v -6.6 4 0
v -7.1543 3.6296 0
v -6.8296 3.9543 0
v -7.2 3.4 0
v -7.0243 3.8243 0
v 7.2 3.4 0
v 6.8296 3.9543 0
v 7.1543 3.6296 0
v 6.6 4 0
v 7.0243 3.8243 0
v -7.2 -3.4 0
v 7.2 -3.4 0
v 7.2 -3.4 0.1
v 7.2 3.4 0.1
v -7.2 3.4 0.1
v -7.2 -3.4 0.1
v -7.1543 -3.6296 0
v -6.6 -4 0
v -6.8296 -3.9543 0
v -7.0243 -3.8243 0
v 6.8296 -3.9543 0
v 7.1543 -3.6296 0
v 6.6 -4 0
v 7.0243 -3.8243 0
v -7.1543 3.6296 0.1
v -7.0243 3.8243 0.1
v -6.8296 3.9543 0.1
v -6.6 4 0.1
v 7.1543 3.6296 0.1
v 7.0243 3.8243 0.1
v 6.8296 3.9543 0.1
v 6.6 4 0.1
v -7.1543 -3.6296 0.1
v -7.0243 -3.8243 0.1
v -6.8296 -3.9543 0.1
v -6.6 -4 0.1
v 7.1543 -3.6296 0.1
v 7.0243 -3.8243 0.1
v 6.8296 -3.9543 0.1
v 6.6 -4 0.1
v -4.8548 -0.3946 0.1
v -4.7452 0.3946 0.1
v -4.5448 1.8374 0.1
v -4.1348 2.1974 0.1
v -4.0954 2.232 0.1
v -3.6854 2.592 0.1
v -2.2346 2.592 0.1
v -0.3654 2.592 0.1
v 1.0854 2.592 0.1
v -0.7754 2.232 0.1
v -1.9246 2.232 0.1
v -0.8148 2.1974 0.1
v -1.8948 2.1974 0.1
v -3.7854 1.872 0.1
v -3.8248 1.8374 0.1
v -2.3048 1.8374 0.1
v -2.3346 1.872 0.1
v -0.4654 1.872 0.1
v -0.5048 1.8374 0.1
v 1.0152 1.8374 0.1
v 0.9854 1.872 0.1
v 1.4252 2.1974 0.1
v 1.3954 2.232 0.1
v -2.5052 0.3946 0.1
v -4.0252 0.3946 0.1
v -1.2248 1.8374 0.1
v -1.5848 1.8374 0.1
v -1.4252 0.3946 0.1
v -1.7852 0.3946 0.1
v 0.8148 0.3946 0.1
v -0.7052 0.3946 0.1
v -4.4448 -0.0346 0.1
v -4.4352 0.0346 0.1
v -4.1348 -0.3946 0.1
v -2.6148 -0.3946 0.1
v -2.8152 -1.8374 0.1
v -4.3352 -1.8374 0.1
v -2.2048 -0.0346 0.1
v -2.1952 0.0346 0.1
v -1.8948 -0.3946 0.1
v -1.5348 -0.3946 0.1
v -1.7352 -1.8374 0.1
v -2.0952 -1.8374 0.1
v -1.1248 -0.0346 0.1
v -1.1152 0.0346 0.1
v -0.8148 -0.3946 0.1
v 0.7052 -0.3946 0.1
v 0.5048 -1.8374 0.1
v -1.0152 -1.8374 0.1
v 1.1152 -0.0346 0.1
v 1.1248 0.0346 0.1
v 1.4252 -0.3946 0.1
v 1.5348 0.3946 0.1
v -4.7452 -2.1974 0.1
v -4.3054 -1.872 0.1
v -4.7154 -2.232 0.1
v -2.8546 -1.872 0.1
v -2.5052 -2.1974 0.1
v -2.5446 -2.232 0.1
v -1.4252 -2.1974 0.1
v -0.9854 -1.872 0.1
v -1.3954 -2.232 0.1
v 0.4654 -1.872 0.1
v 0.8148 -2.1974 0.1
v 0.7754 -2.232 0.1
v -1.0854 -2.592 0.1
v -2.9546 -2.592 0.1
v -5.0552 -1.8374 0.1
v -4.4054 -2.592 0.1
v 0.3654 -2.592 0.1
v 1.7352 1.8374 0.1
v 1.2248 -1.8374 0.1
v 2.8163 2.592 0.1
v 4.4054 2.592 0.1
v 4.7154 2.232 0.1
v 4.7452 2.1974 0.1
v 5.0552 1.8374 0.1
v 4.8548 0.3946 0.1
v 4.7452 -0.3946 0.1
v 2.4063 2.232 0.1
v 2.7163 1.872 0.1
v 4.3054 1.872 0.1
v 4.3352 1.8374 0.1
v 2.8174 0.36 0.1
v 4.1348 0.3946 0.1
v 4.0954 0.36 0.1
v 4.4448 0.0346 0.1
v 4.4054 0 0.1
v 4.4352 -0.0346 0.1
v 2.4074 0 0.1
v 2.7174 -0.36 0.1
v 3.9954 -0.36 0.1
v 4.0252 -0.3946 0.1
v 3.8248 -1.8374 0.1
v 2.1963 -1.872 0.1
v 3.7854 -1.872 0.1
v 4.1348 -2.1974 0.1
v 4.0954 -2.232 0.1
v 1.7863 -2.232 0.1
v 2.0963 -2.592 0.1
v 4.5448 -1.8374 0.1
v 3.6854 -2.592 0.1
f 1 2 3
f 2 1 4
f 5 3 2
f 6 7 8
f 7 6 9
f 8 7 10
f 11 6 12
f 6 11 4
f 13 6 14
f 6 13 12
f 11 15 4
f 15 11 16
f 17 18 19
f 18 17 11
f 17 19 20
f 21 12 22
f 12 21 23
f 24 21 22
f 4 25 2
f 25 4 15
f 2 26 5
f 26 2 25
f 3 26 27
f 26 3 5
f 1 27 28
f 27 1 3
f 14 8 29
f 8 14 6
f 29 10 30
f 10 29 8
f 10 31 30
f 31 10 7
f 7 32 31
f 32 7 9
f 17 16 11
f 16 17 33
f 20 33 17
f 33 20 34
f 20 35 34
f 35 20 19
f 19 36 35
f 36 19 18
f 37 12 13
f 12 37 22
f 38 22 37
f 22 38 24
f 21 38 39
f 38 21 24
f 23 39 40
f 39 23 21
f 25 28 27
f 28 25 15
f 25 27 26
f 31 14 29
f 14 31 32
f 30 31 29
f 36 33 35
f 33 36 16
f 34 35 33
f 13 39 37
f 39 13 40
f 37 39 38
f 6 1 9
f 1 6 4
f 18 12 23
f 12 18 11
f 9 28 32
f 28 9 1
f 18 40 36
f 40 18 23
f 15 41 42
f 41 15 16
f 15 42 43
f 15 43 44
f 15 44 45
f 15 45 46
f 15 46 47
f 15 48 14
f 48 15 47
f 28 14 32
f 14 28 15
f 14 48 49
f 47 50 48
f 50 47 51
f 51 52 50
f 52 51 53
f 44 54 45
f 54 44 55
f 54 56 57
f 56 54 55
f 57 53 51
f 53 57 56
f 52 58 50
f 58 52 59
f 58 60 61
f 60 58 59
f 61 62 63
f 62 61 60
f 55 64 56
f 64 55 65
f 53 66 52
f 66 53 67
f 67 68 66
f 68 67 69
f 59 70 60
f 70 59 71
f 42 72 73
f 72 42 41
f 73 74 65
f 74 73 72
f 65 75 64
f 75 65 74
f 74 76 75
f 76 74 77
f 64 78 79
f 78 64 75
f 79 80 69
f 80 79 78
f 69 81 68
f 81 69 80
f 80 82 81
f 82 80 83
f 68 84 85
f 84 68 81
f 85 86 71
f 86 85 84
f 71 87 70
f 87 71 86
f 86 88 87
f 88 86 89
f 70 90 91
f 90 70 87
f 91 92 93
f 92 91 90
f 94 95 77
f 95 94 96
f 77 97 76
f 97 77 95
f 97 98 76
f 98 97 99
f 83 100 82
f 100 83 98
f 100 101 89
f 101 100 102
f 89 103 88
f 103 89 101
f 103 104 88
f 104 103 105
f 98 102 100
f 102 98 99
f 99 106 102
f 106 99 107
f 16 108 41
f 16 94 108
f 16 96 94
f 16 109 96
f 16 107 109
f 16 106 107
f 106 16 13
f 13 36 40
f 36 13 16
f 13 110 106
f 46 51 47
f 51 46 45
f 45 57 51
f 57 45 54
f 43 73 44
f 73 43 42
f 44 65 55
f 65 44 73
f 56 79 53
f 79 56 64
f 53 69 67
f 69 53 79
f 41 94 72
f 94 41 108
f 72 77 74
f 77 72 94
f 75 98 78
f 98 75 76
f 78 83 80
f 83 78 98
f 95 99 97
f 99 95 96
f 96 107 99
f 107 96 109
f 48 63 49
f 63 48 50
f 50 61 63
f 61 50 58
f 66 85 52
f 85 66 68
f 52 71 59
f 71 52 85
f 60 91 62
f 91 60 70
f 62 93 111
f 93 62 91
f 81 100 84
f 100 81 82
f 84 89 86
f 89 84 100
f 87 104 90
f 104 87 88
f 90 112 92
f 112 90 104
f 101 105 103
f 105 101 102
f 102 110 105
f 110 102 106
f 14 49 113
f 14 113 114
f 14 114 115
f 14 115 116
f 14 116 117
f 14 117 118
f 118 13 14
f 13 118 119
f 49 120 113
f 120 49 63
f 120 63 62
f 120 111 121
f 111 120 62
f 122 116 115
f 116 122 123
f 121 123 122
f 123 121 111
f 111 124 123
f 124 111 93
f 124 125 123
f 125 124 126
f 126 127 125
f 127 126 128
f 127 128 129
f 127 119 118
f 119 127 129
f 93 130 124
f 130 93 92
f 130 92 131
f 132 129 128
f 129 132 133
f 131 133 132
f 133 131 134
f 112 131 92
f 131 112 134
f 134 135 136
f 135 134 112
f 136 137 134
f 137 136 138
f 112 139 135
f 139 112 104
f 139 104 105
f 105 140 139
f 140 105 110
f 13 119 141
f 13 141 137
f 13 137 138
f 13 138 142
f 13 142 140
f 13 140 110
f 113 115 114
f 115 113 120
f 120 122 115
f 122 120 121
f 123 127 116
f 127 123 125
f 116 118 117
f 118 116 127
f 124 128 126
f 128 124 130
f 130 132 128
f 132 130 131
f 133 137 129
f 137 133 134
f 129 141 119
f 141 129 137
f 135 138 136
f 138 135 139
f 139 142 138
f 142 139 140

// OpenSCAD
// file: ../p/box3u12.scad
use <../lib.scad>
function ldraw_lib__box3u12() = [
// 0 Box with 3 Parallel Faces without Any Edges
// 0 Name: box3u12.dat
// 0 Author: J.C. Tchang [tchang]
// 0 !LDRAW_ORG Primitive UPDATE 2014-02
// 0 !LICENSE Licensed under CC BY 4.0 : see CAreadme.txt
// 
// 0 BFC CERTIFY CCW
  [0,"BFC","CERTIFY"],
  [0,"BFC","CCW"],
// 
// 0 !HISTORY 2014-12-23 [PTadmin] Official Update 2014-02
// 
// 
// 4 16 -1 1 1 1 1 1 1 1 -1 -1 1 -1
  [4,16,-1,1,1,1,1,1,1,1,-1,-1,1,-1],
// 4 16 -1 1 1 -1 0 1 1 0 1 1 1 1
  [4,16,-1,1,1,-1,0,1,1,0,1,1,1,1],
// 4 16 1 1 -1 1 0 -1 -1 0 -1 -1 1 -1
  [4,16,1,1,-1,1,0,-1,-1,0,-1,-1,1,-1],
];
module ldraw_lib__box3u12(step=0, col=false, unit=2/5, alt=false, line=0.2, solid=!$preview)
    makepoly(ldraw_lib__box3u12(), step=step, col=col, unit=unit, alt=alt, line=line, solid=solid);
ldraw_lib__box3u12(line=0.2);
// file: ../p/1-4cyli.scad
use <../lib.scad>
function ldraw_lib__1_4cyli() = [
// 0 Cylinder 0.25
// 0 Name: 1-4cyli.dat
// 0 Author: James Jessiman
// 0 !LDRAW_ORG Primitive UPDATE 2012-01
// 0 !LICENSE Licensed under CC BY 4.0 : see CAreadme.txt
// 
// 0 BFC CERTIFY CCW
  [0,"BFC","CERTIFY"],
  [0,"BFC","CCW"],
// 
// 0 !HISTORY 2002-03-23 [sbliss] Added BFC statement.
// 0 !HISTORY 2002-04-25 [PTadmin] Official Update 2002-02
// 0 !HISTORY 2007-06-22 [PTadmin] Header formatted for Contributor Agreement
// 0 !HISTORY 2008-07-01 [PTadmin] Official Update 2008-01
// 0 !HISTORY 2012-02-16 [Philo] Changed to CCW
// 0 !HISTORY 2012-03-30 [PTadmin] Official Update 2012-01
// 
// 
// 4 16 1 1 0 0.9239 1 0.3827 0.9239 0 0.3827 1 0 0
  [4,16,1,1,0,0.9239,1,0.3827,0.9239,0,0.3827,1,0,0],
// 5 24 1 0 0 1 1 0 0.9239 0 0.3827 1 0 -1
  [5,24,1,0,0,1,1,0,0.9239,0,0.3827,1,0,-1],
// 4 16 0.9239 1 0.3827 0.7071 1 0.7071 0.7071 0 0.7071 0.9239 0 0.3827
  [4,16,0.9239,1,0.3827,0.7071,1,0.7071,0.7071,0,0.7071,0.9239,0,0.3827],
// 5 24 0.9239 0 0.3827 0.9239 1 0.3827 0.7071 0 0.7071 1 0 0
  [5,24,0.9239,0,0.3827,0.9239,1,0.3827,0.7071,0,0.7071,1,0,0],
// 4 16 0.7071 1 0.7071 0.3827 1 0.9239 0.3827 0 0.9239 0.7071 0 0.7071
  [4,16,0.7071,1,0.7071,0.3827,1,0.9239,0.3827,0,0.9239,0.7071,0,0.7071],
// 5 24 0.7071 0 0.7071 0.7071 1 0.7071 0.3827 0 0.9239 0.9239 0 0.3827
  [5,24,0.7071,0,0.7071,0.7071,1,0.7071,0.3827,0,0.9239,0.9239,0,0.3827],
// 4 16 0.3827 1 0.9239 0 1 1 0 0 1 0.3827 0 0.9239
  [4,16,0.3827,1,0.9239,0,1,1,0,0,1,0.3827,0,0.9239],
// 5 24 0.3827 0 0.9239 0.3827 1 0.9239 0 0 1 0.7071 0 0.7071
  [5,24,0.3827,0,0.9239,0.3827,1,0.9239,0,0,1,0.7071,0,0.7071],
// 5 24 0 0 1 0 1 1 0.3827 0 0.9239 -1 0 1
  [5,24,0,0,1,0,1,1,0.3827,0,0.9239,-1,0,1],
];
module ldraw_lib__1_4cyli(step=0, col=false, unit=2/5, alt=false, line=0.2, solid=!$preview)
    makepoly(ldraw_lib__1_4cyli(), step=step, col=col, unit=unit, alt=alt, line=line, solid=solid);
ldraw_lib__1_4cyli(line=0.2);
// file: ../p/1-4chrd.scad
use <../lib.scad>
function ldraw_lib__1_4chrd() = [
// 0 Chord 0.25
// 0 Name: 1-4chrd.dat
// 0 Author: Max Martin Richter [MMR1988]
// 0 !LDRAW_ORG Primitive UPDATE 2023-05
// 0 !LICENSE Licensed under CC BY 4.0 : see CAreadme.txt
// 
// 0 BFC CERTIFY CCW
  [0,"BFC","CERTIFY"],
  [0,"BFC","CCW"],
// 
// 0 !HISTORY 2004-04-22 [PTadmin] Official Update 2004-02
// 0 !HISTORY 2007-10-09 [PTadmin] Header formatted for Contributor Agreement
// 0 !HISTORY 2008-07-01 [PTadmin] Official Update 2008-01
// 0 !HISTORY 2012-08-02 [MMR1988] Re-creation with PrimGen2 and Rectifier
// 0 !HISTORY 2012-08-09 [PTadmin] Official Update 2012-02
// 0 !HISTORY 2023-10-27 [OrionP] Change author to MMR1988 from hafhead
// 0 !HISTORY 2023-10-31 [OrionP] Official Update 2023-05
// 
// 4 16 0.9239 0 0.3827 0.3827 0 0.9239 0 0 1 1 0 0
  [4,16,0.9239,0,0.3827,0.3827,0,0.9239,0,0,1,1,0,0],
// 3 16 0.7071 0 0.7071 0.3827 0 0.9239 0.9239 0 0.3827
  [3,16,0.7071,0,0.7071,0.3827,0,0.9239,0.9239,0,0.3827],
];
module ldraw_lib__1_4chrd(step=0, col=false, unit=2/5, alt=false, line=0.2, solid=!$preview)
    makepoly(ldraw_lib__1_4chrd(), step=step, col=col, unit=unit, alt=alt, line=line, solid=solid);
ldraw_lib__1_4chrd(line=0.2);
// main file
use <../lib.scad>
use <s/6221655aks01.scad>
function ldraw_lib__6221655am() = [
// 0 Sticker  1.0 x  1.8 with Yellow Digital "3" on Black Background
// 0 Name: 6221655am.dat
// 0 Author: Massimo Maso [Sirio]
// 0 !LDRAW_ORG Part UPDATE 2024-09
// 0 !LICENSE Licensed under CC BY 4.0 : see CAreadme.txt
// 
// 0 BFC CERTIFY CCW
  [0,"BFC","CERTIFY"],
  [0,"BFC","CCW"],
// 
// 0 !KEYWORDS 3.0, 911 RSR, Set 75888, Speed Champions, Turbo
// 
// 0 !HISTORY 2024-10-27 [OrionP] Official Update 2024-09
// 
// 0 // Subpart
// 1 16 0 0 0 1 0 0 0 1 0 0 0 1 s\6221655aks01.dat
  [1,16,0,0,0,1,0,0,0,1,0,0,0,1, ldraw_lib__s__6221655aks01()],
// 0 // Top face
// 0 // Black faces
// 3 0 18 -.25 8.5 2.7136 -.25 6.48 7.0408 -.25 6.48
  [3,0,18,-.25,8.5,2.7136,-.25,6.48,7.0408,-.25,6.48],
// 3 0 18 -.25 8.5 7.0408 -.25 6.48 11.0136 -.25 6.48
  [3,0,18,-.25,8.5,7.0408,-.25,6.48,11.0136,-.25,6.48],
// 3 0 18 -.25 8.5 11.0136 -.25 6.48 11.7886 -.25 5.58
  [3,0,18,-.25,8.5,11.0136,-.25,6.48,11.7886,-.25,5.58],
// 3 0 18 -.25 8.5 11.7886 -.25 5.58 11.863 -.25 5.4936
  [3,0,18,-.25,8.5,11.7886,-.25,5.58,11.863,-.25,5.4936],
// 3 0 18 -.25 8.5 11.863 -.25 5.4936 12.638 -.25 4.5936
  [3,0,18,-.25,8.5,11.863,-.25,5.4936,12.638,-.25,4.5936],
// 3 0 18 -.25 8.5 12.638 -.25 4.5936 12.137 -.25 .9864
  [3,0,18,-.25,8.5,12.638,-.25,4.5936,12.137,-.25,.9864],
// 4 0 18 -.25 8.5 12.137 -.25 .9864 11.863 -.25 -.9864 18 -.25 -8.5
  [4,0,18,-.25,8.5,12.137,-.25,.9864,11.863,-.25,-.9864,18,-.25,-8.5],
// 4 0 6.0158 -.25 5.58 7.0408 -.25 6.48 2.7136 -.25 6.48 3.4886 -.25 5.58
  [4,0,6.0158,-.25,5.58,7.0408,-.25,6.48,2.7136,-.25,6.48,3.4886,-.25,5.58],
// 3 0 6.0158 -.25 5.58 3.4886 -.25 5.58 3.563 -.25 5.4936
  [3,0,6.0158,-.25,5.58,3.4886,-.25,5.58,3.563,-.25,5.4936],
// 4 0 6.0158 -.25 5.58 3.563 -.25 5.4936 4.338 -.25 4.5936 6.7908 -.25 4.68
  [4,0,6.0158,-.25,5.58,3.563,-.25,5.4936,4.338,-.25,4.5936,6.7908,-.25,4.68],
// 4 0 10.838 -.25 4.5936 11.863 -.25 5.4936 11.7886 -.25 5.58 10.7636 -.25 4.68
  [4,0,10.838,-.25,4.5936,11.863,-.25,5.4936,11.7886,-.25,5.58,10.7636,-.25,4.68],
// 4 0 10.838 -.25 4.5936 10.7636 -.25 4.68 6.7908 -.25 4.68 4.338 -.25 4.5936
  [4,0,10.838,-.25,4.5936,10.7636,-.25,4.68,6.7908,-.25,4.68,4.338,-.25,4.5936],
// 4 0 10.838 -.25 4.5936 4.338 -.25 4.5936 3.837 -.25 .9864 7.0434 -.25 .9
  [4,0,10.838,-.25,4.5936,4.338,-.25,4.5936,3.837,-.25,.9864,7.0434,-.25,.9],
// 4 0 10.838 -.25 4.5936 7.0434 -.25 .9 10.2386 -.25 .9 10.337 -.25 .9864
  [4,0,10.838,-.25,4.5936,7.0434,-.25,.9,10.2386,-.25,.9,10.337,-.25,.9864],
// 4 0 11.112 -.25 .0864 10.337 -.25 .9864 10.2386 -.25 .9 11.0136 -.25 0
  [4,0,11.112,-.25,.0864,10.337,-.25,.9864,10.2386,-.25,.9,11.0136,-.25,0],
// 3 0 11.112 -.25 .0864 11.0136 -.25 0 11.088 -.25 -.0864
  [3,0,11.112,-.25,.0864,11.0136,-.25,0,11.088,-.25,-.0864],
// 4 0 11.112 -.25 .0864 11.088 -.25 -.0864 11.863 -.25 -.9864 12.137 -.25 .9864
  [4,0,11.112,-.25,.0864,11.088,-.25,-.0864,11.863,-.25,-.9864,12.137,-.25,.9864],
// 4 0 6.0184 -.25 0 7.0434 -.25 .9 3.837 -.25 .9864 3.563 -.25 -.9864
  [4,0,6.0184,-.25,0,7.0434,-.25,.9,3.837,-.25,.9864,3.563,-.25,-.9864],
// 3 0 6.0184 -.25 0 3.563 -.25 -.9864 6.7934 -.25 -.9
  [3,0,6.0184,-.25,0,3.563,-.25,-.9864,6.7934,-.25,-.9],
// 4 0 11.0136 -.25 0 9.9886 -.25 -.9 10.063 -.25 -.9864 11.088 -.25 -.0864
  [4,0,11.0136,-.25,0,9.9886,-.25,-.9,10.063,-.25,-.9864,11.088,-.25,-.0864],
// 4 0 9.562 -.25 -4.5936 10.063 -.25 -.9864 9.9886 -.25 -.9 6.7934 -.25 -.9
  [4,0,9.562,-.25,-4.5936,10.063,-.25,-.9864,9.9886,-.25,-.9,6.7934,-.25,-.9],
// 4 0 9.562 -.25 -4.5936 6.7934 -.25 -.9 3.563 -.25 -.9864 3.062 -.25 -4.5936
  [4,0,9.562,-.25,-4.5936,6.7934,-.25,-.9,3.563,-.25,-.9864,3.062,-.25,-4.5936],
// 4 0 9.562 -.25 -4.5936 3.062 -.25 -4.5936 5.4908 -.25 -4.68 9.4636 -.25 -4.68
  [4,0,9.562,-.25,-4.5936,3.062,-.25,-4.5936,5.4908,-.25,-4.68,9.4636,-.25,-4.68],
// 4 0 9.562 -.25 -4.5936 9.4636 -.25 -4.68 10.2386 -.25 -5.58 10.337 -.25 -5.4936
  [4,0,9.562,-.25,-4.5936,9.4636,-.25,-4.68,10.2386,-.25,-5.58,10.337,-.25,-5.4936],
// 4 0 4.4658 -.25 -5.58 5.4908 -.25 -4.68 3.062 -.25 -4.5936 2.037 -.25 -5.4936
  [4,0,4.4658,-.25,-5.58,5.4908,-.25,-4.68,3.062,-.25,-4.5936,2.037,-.25,-5.4936],
// 3 0 4.4658 -.25 -5.58 2.037 -.25 -5.4936 1.9386 -.25 -5.58
  [3,0,4.4658,-.25,-5.58,2.037,-.25,-5.4936,1.9386,-.25,-5.58],
// 4 0 4.4658 -.25 -5.58 1.9386 -.25 -5.58 .9136 -.25 -6.48 5.2408 -.25 -6.48
  [4,0,4.4658,-.25,-5.58,1.9386,-.25,-5.58,.9136,-.25,-6.48,5.2408,-.25,-6.48],
// 3 0 18 -.25 -8.5 11.863 -.25 -.9864 11.362 -.25 -4.5936
  [3,0,18,-.25,-8.5,11.863,-.25,-.9864,11.362,-.25,-4.5936],
// 3 0 18 -.25 -8.5 11.362 -.25 -4.5936 10.337 -.25 -5.4936
  [3,0,18,-.25,-8.5,11.362,-.25,-4.5936,10.337,-.25,-5.4936],
// 3 0 18 -.25 -8.5 10.337 -.25 -5.4936 10.2386 -.25 -5.58
  [3,0,18,-.25,-8.5,10.337,-.25,-5.4936,10.2386,-.25,-5.58],
// 3 0 18 -.25 -8.5 10.2386 -.25 -5.58 9.2136 -.25 -6.48
  [3,0,18,-.25,-8.5,10.2386,-.25,-5.58,9.2136,-.25,-6.48],
// 3 0 18 -.25 -8.5 9.2136 -.25 -6.48 5.2408 -.25 -6.48
  [3,0,18,-.25,-8.5,9.2136,-.25,-6.48,5.2408,-.25,-6.48],
// 3 0 18 -.25 -8.5 5.2408 -.25 -6.48 .9136 -.25 -6.48
  [3,0,18,-.25,-8.5,5.2408,-.25,-6.48,.9136,-.25,-6.48],
// 0 // Yellow number
// 4 14 6.0158 -.25 5.58 11.7886 -.25 5.58 11.0136 -.25 6.48 7.0408 -.25 6.48
  [4,14,6.0158,-.25,5.58,11.7886,-.25,5.58,11.0136,-.25,6.48,7.0408,-.25,6.48],
// 4 14 6.0158 -.25 5.58 6.7908 -.25 4.68 10.7636 -.25 4.68 11.7886 -.25 5.58
  [4,14,6.0158,-.25,5.58,6.7908,-.25,4.68,10.7636,-.25,4.68,11.7886,-.25,5.58],
// 4 14 11.863 -.25 5.4936 10.838 -.25 4.5936 10.337 -.25 .9864 11.112 -.25 .0864
  [4,14,11.863,-.25,5.4936,10.838,-.25,4.5936,10.337,-.25,.9864,11.112,-.25,.0864],
// 4 14 11.863 -.25 5.4936 11.112 -.25 .0864 12.137 -.25 .9864 12.638 -.25 4.5936
  [4,14,11.863,-.25,5.4936,11.112,-.25,.0864,12.137,-.25,.9864,12.638,-.25,4.5936],
// 4 14 6.0184 -.25 0 11.0136 -.25 0 10.2386 -.25 .9 7.0434 -.25 .9
  [4,14,6.0184,-.25,0,11.0136,-.25,0,10.2386,-.25,.9,7.0434,-.25,.9],
// 4 14 6.0184 -.25 0 6.7934 -.25 -.9 9.9886 -.25 -.9 11.0136 -.25 0
  [4,14,6.0184,-.25,0,6.7934,-.25,-.9,9.9886,-.25,-.9,11.0136,-.25,0],
// 4 14 11.088 -.25 -.0864 10.063 -.25 -.9864 9.562 -.25 -4.5936 10.337 -.25 -5.4936
  [4,14,11.088,-.25,-.0864,10.063,-.25,-.9864,9.562,-.25,-4.5936,10.337,-.25,-5.4936],
// 4 14 11.088 -.25 -.0864 10.337 -.25 -5.4936 11.362 -.25 -4.5936 11.863 -.25 -.9864
  [4,14,11.088,-.25,-.0864,10.337,-.25,-5.4936,11.362,-.25,-4.5936,11.863,-.25,-.9864],
// 4 14 4.4658 -.25 -5.58 10.2386 -.25 -5.58 9.4636 -.25 -4.68 5.4908 -.25 -4.68
  [4,14,4.4658,-.25,-5.58,10.2386,-.25,-5.58,9.4636,-.25,-4.68,5.4908,-.25,-4.68],
// 4 14 4.4658 -.25 -5.58 5.2408 -.25 -6.48 9.2136 -.25 -6.48 10.2386 -.25 -5.58
  [4,14,4.4658,-.25,-5.58,5.2408,-.25,-6.48,9.2136,-.25,-6.48,10.2386,-.25,-5.58],
];
module ldraw_lib__6221655am(step=0, col=false, unit=2/5, alt=false, line=0.2, solid=!$preview)
    makepoly(ldraw_lib__6221655am(), step=step, col=col, unit=unit, alt=alt, line=line, solid=solid);
ldraw_lib__6221655am(line=0.2);
